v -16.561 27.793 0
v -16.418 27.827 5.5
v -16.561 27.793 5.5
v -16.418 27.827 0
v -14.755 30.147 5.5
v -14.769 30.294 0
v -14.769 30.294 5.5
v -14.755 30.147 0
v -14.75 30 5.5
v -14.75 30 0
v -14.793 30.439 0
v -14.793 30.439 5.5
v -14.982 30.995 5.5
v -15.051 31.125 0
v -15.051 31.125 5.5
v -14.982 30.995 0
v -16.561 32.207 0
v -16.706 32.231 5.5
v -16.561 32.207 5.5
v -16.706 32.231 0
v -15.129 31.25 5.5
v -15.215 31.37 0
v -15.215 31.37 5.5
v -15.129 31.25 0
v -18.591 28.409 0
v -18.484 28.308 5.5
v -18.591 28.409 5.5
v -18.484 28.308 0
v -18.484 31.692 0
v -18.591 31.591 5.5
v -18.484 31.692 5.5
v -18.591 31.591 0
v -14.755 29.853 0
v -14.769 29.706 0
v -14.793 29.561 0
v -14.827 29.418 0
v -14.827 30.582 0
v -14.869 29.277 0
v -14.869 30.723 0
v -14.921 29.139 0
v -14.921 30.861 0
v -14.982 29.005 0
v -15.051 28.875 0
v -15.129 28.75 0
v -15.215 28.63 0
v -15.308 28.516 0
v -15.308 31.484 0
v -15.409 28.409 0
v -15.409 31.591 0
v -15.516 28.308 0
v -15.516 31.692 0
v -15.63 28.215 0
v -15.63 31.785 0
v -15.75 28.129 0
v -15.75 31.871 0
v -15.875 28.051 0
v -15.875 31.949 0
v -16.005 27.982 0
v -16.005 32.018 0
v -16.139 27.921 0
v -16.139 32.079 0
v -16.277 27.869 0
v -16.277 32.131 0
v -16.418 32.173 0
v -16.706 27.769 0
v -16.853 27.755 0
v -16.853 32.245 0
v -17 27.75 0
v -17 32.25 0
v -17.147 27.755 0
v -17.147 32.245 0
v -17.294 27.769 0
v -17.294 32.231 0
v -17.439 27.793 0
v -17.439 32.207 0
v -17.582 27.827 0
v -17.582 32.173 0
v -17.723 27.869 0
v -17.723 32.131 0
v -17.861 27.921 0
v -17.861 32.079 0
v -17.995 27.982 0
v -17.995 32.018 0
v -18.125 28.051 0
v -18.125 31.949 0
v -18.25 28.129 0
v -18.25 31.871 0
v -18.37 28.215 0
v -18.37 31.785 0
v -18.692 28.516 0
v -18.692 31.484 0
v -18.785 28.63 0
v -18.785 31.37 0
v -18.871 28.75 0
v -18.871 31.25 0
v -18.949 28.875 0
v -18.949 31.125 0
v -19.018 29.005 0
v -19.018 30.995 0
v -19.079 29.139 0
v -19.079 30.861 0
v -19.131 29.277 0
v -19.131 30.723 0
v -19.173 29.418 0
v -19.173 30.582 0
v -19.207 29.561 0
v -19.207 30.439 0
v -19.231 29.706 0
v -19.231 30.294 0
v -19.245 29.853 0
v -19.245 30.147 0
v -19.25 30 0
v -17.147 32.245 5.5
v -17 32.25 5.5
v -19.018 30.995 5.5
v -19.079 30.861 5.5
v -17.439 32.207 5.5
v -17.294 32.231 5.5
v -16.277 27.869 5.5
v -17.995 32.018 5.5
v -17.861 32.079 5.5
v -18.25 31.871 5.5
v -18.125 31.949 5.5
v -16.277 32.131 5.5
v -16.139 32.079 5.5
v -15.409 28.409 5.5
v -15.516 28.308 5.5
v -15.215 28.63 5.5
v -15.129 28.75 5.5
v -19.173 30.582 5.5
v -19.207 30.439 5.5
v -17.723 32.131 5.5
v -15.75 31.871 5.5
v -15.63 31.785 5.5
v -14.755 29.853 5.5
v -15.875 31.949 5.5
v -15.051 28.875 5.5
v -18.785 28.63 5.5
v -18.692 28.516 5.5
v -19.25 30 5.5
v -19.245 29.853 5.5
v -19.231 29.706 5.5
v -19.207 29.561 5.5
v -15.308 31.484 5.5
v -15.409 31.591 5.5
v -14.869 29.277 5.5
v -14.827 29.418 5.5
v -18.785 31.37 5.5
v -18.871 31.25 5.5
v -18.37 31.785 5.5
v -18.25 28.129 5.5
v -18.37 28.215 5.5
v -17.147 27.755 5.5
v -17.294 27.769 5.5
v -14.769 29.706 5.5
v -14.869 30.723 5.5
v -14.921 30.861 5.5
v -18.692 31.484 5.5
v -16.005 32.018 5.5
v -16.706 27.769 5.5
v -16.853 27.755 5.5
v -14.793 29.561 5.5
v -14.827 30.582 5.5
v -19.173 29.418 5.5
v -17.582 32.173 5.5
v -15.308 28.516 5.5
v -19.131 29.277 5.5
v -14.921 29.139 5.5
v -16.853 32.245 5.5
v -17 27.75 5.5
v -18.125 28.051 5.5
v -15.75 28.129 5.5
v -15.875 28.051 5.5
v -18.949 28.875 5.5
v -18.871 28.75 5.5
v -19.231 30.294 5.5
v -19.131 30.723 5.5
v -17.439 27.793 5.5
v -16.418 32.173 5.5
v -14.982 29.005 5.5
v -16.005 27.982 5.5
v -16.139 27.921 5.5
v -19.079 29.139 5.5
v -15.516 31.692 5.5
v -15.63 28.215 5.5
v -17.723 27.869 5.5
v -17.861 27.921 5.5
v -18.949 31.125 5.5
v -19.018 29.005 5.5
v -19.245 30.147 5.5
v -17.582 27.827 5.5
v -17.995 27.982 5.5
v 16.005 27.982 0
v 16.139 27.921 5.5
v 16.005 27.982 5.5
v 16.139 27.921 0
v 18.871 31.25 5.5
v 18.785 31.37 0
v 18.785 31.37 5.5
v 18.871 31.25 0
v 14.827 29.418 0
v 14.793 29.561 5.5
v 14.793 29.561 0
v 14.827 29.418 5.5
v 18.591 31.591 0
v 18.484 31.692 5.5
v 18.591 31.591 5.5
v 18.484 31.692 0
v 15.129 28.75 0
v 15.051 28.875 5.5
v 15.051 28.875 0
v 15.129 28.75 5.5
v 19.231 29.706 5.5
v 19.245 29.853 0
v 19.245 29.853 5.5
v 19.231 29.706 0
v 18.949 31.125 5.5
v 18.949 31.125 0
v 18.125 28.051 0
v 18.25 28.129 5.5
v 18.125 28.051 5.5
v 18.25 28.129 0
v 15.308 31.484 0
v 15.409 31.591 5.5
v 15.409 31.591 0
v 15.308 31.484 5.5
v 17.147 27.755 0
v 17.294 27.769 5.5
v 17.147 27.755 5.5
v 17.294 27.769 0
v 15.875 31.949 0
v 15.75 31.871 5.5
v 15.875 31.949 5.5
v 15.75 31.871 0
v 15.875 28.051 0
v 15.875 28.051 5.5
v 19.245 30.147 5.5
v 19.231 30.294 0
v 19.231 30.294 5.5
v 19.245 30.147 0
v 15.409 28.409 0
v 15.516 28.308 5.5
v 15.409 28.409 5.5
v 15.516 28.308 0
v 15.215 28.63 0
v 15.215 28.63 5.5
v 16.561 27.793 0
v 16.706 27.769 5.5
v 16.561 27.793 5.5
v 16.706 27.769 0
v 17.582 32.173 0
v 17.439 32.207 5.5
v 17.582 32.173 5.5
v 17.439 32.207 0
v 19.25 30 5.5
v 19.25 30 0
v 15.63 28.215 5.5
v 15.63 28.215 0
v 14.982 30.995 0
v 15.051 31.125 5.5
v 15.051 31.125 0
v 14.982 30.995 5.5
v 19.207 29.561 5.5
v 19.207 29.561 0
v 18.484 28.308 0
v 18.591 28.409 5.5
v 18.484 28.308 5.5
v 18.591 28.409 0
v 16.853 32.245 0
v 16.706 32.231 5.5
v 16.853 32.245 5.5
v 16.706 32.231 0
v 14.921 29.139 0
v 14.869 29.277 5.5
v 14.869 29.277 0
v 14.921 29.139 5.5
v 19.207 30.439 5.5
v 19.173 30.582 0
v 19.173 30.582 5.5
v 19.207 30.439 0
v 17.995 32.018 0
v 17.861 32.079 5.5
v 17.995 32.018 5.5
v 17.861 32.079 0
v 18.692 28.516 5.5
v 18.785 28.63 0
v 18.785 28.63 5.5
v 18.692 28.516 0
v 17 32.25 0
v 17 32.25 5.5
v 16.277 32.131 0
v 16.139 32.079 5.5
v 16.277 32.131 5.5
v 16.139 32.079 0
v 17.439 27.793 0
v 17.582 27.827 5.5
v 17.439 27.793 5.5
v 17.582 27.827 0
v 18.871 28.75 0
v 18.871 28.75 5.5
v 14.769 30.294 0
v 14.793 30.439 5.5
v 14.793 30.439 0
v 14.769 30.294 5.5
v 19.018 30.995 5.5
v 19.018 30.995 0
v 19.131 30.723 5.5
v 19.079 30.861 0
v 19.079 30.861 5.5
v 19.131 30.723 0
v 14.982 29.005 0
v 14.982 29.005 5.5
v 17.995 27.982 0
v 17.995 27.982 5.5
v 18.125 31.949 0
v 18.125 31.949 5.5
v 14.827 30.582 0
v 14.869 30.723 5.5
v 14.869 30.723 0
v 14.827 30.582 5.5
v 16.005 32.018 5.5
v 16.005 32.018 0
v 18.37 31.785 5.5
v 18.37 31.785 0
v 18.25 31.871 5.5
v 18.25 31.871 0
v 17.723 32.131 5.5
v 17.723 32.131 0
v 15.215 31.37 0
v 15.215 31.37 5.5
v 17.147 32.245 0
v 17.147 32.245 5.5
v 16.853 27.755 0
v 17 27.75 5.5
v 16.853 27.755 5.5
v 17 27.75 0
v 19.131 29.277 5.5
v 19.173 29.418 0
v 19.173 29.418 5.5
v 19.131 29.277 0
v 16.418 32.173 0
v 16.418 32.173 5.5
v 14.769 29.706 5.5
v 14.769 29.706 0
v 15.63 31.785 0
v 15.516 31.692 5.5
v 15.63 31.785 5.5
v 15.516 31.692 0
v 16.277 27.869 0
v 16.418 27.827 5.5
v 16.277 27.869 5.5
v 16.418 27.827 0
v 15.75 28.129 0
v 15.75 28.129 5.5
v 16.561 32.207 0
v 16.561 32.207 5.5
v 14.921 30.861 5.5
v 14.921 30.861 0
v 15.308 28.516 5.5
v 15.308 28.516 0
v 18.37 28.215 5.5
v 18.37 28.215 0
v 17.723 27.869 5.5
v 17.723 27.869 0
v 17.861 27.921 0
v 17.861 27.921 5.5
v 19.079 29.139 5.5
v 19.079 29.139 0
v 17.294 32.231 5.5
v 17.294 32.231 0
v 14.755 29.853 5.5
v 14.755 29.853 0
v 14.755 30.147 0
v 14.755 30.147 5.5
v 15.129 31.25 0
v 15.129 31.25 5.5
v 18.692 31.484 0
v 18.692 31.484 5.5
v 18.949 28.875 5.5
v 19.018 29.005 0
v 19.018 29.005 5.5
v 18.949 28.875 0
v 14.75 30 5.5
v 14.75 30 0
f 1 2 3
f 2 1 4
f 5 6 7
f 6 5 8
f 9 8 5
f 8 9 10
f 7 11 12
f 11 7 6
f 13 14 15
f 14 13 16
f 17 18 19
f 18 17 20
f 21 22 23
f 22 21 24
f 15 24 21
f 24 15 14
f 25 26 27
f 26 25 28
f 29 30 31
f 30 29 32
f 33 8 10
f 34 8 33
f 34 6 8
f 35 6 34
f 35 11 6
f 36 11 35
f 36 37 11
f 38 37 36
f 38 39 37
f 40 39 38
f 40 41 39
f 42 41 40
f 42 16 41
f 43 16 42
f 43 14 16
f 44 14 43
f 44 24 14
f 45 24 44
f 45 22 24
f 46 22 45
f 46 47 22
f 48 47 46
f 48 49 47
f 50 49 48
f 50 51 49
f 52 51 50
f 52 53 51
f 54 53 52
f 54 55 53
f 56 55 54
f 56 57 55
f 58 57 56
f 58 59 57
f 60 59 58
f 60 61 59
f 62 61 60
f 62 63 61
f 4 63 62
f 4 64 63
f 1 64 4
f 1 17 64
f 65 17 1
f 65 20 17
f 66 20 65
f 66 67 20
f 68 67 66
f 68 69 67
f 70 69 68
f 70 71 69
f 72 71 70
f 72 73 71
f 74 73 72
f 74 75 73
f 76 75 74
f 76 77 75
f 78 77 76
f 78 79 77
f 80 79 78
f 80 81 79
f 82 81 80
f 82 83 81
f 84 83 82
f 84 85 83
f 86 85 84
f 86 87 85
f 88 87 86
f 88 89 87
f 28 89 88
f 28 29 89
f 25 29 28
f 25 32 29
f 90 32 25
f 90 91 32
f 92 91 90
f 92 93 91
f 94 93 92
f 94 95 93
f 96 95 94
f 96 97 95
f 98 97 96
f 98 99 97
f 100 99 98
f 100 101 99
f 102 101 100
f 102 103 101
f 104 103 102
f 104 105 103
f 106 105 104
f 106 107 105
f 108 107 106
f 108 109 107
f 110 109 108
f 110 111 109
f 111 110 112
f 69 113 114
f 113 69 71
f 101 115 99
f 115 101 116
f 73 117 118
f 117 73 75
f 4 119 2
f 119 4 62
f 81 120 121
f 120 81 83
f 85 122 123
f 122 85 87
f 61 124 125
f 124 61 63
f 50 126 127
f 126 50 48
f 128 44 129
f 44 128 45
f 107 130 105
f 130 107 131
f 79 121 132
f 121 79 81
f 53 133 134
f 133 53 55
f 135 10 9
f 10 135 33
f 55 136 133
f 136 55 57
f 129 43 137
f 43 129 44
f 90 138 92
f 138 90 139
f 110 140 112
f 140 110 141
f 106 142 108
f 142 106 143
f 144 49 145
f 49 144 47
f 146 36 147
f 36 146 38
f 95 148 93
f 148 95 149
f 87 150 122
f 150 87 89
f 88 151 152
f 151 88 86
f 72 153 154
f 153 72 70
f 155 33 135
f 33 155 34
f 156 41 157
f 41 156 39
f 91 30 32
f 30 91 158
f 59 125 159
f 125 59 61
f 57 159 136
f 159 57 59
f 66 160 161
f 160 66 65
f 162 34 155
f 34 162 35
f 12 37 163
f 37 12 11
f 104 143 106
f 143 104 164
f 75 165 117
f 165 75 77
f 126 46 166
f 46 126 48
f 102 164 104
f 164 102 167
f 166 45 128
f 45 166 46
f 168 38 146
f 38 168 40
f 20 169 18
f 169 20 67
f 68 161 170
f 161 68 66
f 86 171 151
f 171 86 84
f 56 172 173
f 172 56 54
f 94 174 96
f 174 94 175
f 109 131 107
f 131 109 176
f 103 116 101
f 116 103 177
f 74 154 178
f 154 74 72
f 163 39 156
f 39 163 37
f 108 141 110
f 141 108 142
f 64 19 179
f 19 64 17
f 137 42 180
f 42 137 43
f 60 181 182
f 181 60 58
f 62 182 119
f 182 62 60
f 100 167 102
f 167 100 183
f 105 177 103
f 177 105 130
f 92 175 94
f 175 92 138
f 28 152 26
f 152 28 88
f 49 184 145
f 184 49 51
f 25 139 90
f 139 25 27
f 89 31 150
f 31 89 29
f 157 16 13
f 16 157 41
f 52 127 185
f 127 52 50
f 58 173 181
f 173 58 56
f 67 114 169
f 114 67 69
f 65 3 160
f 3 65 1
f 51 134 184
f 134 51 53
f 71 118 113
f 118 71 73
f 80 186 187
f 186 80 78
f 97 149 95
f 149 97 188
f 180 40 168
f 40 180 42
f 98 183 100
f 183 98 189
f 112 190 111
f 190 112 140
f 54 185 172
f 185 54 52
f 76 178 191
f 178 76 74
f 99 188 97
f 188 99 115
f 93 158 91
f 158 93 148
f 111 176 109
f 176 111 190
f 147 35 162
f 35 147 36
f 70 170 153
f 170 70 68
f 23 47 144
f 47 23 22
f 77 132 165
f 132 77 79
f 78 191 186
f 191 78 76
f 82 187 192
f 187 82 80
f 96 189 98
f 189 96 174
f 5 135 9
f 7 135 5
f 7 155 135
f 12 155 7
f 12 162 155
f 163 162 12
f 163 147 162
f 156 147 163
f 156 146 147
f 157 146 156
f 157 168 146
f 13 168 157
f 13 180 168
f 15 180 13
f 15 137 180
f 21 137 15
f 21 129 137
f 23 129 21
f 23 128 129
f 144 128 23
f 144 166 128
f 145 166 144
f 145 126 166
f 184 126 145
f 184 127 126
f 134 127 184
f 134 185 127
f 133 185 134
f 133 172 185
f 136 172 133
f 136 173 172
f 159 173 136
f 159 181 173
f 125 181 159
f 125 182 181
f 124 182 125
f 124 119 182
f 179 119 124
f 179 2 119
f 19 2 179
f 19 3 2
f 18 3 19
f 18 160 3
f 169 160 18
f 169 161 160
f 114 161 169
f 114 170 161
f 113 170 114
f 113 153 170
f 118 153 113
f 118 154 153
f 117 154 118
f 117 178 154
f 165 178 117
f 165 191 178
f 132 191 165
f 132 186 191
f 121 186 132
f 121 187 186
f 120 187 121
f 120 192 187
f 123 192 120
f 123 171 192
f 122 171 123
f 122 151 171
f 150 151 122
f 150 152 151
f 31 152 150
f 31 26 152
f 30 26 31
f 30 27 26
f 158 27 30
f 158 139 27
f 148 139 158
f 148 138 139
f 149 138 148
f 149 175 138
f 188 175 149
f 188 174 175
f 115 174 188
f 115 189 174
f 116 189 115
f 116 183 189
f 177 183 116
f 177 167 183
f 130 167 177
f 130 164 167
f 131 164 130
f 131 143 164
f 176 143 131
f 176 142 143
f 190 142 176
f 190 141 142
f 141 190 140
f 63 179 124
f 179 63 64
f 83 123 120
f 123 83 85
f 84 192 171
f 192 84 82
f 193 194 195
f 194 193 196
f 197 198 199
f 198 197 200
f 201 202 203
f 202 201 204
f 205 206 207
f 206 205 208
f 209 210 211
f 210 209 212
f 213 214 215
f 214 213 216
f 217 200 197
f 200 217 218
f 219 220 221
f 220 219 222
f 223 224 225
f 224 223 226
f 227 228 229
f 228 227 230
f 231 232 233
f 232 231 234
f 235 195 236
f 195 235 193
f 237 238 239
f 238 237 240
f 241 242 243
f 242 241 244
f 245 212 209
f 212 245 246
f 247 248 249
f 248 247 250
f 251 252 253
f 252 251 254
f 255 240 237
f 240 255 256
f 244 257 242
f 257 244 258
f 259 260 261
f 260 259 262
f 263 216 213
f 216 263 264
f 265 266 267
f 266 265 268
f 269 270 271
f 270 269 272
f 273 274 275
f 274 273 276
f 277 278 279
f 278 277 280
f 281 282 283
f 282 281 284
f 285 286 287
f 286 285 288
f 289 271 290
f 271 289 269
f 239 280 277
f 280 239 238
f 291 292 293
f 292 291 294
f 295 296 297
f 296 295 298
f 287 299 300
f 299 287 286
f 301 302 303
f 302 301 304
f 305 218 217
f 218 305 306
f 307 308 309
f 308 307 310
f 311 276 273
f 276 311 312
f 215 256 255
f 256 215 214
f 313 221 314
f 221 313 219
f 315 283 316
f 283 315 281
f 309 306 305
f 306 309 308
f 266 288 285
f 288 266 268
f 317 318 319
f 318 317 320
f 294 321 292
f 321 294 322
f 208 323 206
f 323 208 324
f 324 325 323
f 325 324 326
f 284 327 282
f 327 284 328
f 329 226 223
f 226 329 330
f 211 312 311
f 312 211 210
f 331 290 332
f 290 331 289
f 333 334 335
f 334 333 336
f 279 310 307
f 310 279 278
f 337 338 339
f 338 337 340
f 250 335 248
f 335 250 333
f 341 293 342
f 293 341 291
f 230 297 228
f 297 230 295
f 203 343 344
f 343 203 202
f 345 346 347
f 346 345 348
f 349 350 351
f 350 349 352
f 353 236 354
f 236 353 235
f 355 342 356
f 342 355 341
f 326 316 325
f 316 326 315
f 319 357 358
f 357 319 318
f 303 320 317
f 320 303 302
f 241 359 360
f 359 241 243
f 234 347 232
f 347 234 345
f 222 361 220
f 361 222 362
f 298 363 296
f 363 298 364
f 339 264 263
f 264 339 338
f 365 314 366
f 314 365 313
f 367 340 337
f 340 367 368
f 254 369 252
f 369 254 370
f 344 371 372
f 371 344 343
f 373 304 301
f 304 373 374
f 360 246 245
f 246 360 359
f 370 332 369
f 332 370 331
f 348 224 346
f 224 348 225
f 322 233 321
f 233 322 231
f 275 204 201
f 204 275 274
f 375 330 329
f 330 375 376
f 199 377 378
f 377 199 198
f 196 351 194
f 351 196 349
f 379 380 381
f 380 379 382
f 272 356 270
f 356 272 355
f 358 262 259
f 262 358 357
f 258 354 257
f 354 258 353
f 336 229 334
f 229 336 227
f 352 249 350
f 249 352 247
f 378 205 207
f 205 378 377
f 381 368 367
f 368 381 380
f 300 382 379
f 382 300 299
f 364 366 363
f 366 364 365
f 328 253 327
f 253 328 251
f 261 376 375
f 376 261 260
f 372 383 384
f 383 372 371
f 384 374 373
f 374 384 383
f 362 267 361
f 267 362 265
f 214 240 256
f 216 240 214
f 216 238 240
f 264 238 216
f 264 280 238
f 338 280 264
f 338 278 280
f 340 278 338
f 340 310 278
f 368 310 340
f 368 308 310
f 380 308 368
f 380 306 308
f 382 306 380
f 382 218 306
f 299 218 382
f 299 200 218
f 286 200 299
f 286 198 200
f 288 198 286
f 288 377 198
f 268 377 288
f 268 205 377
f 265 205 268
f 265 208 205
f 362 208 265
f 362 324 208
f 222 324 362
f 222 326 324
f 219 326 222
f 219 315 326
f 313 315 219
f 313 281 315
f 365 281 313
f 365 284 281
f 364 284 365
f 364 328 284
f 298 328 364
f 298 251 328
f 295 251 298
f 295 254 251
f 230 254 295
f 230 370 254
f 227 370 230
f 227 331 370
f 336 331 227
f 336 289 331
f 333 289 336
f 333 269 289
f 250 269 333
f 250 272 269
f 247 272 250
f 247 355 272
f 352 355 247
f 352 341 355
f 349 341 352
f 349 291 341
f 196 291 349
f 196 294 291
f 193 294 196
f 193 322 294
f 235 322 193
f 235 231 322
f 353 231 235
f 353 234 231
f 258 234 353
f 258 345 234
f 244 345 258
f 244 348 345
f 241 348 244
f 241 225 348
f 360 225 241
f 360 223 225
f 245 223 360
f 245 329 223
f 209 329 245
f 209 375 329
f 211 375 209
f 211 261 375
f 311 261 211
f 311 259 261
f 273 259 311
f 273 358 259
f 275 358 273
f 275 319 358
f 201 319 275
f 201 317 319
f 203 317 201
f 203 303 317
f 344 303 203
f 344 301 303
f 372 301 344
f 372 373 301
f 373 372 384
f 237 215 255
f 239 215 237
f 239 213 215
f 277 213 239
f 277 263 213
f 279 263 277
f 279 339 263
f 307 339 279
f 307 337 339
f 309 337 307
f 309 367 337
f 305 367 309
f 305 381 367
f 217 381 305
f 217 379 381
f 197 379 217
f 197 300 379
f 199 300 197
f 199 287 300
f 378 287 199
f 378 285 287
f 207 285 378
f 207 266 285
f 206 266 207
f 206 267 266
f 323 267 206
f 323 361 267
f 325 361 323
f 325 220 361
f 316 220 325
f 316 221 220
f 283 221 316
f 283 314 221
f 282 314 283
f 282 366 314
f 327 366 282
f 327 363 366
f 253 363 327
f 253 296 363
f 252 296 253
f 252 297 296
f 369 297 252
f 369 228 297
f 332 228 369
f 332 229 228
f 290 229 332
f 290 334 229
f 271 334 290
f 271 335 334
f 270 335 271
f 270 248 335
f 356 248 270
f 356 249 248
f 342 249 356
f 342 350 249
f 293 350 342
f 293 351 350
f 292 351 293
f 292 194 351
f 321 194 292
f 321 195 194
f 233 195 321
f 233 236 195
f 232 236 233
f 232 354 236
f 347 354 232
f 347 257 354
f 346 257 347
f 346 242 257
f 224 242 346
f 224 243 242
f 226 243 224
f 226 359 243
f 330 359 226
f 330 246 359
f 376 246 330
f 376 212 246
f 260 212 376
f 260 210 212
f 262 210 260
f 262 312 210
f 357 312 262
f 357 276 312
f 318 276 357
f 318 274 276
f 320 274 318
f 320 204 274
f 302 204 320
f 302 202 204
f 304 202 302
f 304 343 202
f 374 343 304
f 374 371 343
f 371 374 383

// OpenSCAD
// L-shaped mounting bracket for NEMA 17 stepper motor
// Print orientation: base plate on bed, vertical plate builds up in +Z

// ---- Base plate ----
base_x = -25;      // plate spans x = -25 to 25
base_y = 45;       // plate spans y = 0 to 45
base_z = 5;        // plate thickness

// ---- Motor plate ----
motor_x = -25;     // plate spans x = -25 to 25
motor_y = 5;       // plate spans y = 0 to 5
motor_z = 50;      // plate height (z = 0 to 50)

// ---- Boss hole ----
boss_d = 23;       // motor centring boss hole diameter
boss_x = 0;        // hole centre x
boss_z = 28;       // hole centre z

// ---- Screw holes ----
screw_d = 3.4;     // M3 screw hole diameter
screw_p = 31;      // square pattern side length
screw_h = 4.5;     // screw hole depth

// ---- Gussets ----
gusset_t = 5;      // gusset thickness (along X)
gusset_y = 5;      // gusset leg length along Y
gusset_z = 5;      // gusset leg length along Z
gusset_x = -20;    // left gusset spans x = -25 to -20

// ---- Misc ----
eps = 0.5;         // cutter overshoot past faces
$fn = 96;          // curve resolution

difference() {
    union() {
        // Base plate with M4 through-holes
        translate([base_x, 0, 0])
            cube([base_x - base_x, base_y, base_z]);
        for (sx = [-17, 17])
            translate([sx, 30, 0])
                cylinder(d = 4.5, h = base_z + eps);

        // Vertical motor plate
        translate([motor_x, 0, 0])
            cube([motor_x - motor_x, motor_y, motor_z]);
    }

    // Boss hole cut along Y
    translate([boss_x, 0, boss_z])
        rotate([90, 0, 0])
            cylinder(d = boss_d, h = motor_y + 2 * eps);

    // M3 screw holes on square pattern centred on boss hole
    for (i = [0 : 3]) {
        r = screw_p / 2;
        a = i * 90;
        translate([boss_x + r * cos(a), 0, boss_z + screw_h])
            rotate([90, 0, 0])
                cylinder(d = screw_d, h = motor_y + eps);
    }

    // Gussets flush with left and right edges
    for (sx = [-25, 25])
        translate([sx, 0, 0])
            rotate([90, 0, 0])
                linear_extrude(height = gusset_t)
                    polygon(points = [
                        [gusset_y, gusset_z],
                        [gusset_y + eps, gusset_z],
                        [gusset_y + eps, gusset_z + gusset_z]
                    ]);
}
